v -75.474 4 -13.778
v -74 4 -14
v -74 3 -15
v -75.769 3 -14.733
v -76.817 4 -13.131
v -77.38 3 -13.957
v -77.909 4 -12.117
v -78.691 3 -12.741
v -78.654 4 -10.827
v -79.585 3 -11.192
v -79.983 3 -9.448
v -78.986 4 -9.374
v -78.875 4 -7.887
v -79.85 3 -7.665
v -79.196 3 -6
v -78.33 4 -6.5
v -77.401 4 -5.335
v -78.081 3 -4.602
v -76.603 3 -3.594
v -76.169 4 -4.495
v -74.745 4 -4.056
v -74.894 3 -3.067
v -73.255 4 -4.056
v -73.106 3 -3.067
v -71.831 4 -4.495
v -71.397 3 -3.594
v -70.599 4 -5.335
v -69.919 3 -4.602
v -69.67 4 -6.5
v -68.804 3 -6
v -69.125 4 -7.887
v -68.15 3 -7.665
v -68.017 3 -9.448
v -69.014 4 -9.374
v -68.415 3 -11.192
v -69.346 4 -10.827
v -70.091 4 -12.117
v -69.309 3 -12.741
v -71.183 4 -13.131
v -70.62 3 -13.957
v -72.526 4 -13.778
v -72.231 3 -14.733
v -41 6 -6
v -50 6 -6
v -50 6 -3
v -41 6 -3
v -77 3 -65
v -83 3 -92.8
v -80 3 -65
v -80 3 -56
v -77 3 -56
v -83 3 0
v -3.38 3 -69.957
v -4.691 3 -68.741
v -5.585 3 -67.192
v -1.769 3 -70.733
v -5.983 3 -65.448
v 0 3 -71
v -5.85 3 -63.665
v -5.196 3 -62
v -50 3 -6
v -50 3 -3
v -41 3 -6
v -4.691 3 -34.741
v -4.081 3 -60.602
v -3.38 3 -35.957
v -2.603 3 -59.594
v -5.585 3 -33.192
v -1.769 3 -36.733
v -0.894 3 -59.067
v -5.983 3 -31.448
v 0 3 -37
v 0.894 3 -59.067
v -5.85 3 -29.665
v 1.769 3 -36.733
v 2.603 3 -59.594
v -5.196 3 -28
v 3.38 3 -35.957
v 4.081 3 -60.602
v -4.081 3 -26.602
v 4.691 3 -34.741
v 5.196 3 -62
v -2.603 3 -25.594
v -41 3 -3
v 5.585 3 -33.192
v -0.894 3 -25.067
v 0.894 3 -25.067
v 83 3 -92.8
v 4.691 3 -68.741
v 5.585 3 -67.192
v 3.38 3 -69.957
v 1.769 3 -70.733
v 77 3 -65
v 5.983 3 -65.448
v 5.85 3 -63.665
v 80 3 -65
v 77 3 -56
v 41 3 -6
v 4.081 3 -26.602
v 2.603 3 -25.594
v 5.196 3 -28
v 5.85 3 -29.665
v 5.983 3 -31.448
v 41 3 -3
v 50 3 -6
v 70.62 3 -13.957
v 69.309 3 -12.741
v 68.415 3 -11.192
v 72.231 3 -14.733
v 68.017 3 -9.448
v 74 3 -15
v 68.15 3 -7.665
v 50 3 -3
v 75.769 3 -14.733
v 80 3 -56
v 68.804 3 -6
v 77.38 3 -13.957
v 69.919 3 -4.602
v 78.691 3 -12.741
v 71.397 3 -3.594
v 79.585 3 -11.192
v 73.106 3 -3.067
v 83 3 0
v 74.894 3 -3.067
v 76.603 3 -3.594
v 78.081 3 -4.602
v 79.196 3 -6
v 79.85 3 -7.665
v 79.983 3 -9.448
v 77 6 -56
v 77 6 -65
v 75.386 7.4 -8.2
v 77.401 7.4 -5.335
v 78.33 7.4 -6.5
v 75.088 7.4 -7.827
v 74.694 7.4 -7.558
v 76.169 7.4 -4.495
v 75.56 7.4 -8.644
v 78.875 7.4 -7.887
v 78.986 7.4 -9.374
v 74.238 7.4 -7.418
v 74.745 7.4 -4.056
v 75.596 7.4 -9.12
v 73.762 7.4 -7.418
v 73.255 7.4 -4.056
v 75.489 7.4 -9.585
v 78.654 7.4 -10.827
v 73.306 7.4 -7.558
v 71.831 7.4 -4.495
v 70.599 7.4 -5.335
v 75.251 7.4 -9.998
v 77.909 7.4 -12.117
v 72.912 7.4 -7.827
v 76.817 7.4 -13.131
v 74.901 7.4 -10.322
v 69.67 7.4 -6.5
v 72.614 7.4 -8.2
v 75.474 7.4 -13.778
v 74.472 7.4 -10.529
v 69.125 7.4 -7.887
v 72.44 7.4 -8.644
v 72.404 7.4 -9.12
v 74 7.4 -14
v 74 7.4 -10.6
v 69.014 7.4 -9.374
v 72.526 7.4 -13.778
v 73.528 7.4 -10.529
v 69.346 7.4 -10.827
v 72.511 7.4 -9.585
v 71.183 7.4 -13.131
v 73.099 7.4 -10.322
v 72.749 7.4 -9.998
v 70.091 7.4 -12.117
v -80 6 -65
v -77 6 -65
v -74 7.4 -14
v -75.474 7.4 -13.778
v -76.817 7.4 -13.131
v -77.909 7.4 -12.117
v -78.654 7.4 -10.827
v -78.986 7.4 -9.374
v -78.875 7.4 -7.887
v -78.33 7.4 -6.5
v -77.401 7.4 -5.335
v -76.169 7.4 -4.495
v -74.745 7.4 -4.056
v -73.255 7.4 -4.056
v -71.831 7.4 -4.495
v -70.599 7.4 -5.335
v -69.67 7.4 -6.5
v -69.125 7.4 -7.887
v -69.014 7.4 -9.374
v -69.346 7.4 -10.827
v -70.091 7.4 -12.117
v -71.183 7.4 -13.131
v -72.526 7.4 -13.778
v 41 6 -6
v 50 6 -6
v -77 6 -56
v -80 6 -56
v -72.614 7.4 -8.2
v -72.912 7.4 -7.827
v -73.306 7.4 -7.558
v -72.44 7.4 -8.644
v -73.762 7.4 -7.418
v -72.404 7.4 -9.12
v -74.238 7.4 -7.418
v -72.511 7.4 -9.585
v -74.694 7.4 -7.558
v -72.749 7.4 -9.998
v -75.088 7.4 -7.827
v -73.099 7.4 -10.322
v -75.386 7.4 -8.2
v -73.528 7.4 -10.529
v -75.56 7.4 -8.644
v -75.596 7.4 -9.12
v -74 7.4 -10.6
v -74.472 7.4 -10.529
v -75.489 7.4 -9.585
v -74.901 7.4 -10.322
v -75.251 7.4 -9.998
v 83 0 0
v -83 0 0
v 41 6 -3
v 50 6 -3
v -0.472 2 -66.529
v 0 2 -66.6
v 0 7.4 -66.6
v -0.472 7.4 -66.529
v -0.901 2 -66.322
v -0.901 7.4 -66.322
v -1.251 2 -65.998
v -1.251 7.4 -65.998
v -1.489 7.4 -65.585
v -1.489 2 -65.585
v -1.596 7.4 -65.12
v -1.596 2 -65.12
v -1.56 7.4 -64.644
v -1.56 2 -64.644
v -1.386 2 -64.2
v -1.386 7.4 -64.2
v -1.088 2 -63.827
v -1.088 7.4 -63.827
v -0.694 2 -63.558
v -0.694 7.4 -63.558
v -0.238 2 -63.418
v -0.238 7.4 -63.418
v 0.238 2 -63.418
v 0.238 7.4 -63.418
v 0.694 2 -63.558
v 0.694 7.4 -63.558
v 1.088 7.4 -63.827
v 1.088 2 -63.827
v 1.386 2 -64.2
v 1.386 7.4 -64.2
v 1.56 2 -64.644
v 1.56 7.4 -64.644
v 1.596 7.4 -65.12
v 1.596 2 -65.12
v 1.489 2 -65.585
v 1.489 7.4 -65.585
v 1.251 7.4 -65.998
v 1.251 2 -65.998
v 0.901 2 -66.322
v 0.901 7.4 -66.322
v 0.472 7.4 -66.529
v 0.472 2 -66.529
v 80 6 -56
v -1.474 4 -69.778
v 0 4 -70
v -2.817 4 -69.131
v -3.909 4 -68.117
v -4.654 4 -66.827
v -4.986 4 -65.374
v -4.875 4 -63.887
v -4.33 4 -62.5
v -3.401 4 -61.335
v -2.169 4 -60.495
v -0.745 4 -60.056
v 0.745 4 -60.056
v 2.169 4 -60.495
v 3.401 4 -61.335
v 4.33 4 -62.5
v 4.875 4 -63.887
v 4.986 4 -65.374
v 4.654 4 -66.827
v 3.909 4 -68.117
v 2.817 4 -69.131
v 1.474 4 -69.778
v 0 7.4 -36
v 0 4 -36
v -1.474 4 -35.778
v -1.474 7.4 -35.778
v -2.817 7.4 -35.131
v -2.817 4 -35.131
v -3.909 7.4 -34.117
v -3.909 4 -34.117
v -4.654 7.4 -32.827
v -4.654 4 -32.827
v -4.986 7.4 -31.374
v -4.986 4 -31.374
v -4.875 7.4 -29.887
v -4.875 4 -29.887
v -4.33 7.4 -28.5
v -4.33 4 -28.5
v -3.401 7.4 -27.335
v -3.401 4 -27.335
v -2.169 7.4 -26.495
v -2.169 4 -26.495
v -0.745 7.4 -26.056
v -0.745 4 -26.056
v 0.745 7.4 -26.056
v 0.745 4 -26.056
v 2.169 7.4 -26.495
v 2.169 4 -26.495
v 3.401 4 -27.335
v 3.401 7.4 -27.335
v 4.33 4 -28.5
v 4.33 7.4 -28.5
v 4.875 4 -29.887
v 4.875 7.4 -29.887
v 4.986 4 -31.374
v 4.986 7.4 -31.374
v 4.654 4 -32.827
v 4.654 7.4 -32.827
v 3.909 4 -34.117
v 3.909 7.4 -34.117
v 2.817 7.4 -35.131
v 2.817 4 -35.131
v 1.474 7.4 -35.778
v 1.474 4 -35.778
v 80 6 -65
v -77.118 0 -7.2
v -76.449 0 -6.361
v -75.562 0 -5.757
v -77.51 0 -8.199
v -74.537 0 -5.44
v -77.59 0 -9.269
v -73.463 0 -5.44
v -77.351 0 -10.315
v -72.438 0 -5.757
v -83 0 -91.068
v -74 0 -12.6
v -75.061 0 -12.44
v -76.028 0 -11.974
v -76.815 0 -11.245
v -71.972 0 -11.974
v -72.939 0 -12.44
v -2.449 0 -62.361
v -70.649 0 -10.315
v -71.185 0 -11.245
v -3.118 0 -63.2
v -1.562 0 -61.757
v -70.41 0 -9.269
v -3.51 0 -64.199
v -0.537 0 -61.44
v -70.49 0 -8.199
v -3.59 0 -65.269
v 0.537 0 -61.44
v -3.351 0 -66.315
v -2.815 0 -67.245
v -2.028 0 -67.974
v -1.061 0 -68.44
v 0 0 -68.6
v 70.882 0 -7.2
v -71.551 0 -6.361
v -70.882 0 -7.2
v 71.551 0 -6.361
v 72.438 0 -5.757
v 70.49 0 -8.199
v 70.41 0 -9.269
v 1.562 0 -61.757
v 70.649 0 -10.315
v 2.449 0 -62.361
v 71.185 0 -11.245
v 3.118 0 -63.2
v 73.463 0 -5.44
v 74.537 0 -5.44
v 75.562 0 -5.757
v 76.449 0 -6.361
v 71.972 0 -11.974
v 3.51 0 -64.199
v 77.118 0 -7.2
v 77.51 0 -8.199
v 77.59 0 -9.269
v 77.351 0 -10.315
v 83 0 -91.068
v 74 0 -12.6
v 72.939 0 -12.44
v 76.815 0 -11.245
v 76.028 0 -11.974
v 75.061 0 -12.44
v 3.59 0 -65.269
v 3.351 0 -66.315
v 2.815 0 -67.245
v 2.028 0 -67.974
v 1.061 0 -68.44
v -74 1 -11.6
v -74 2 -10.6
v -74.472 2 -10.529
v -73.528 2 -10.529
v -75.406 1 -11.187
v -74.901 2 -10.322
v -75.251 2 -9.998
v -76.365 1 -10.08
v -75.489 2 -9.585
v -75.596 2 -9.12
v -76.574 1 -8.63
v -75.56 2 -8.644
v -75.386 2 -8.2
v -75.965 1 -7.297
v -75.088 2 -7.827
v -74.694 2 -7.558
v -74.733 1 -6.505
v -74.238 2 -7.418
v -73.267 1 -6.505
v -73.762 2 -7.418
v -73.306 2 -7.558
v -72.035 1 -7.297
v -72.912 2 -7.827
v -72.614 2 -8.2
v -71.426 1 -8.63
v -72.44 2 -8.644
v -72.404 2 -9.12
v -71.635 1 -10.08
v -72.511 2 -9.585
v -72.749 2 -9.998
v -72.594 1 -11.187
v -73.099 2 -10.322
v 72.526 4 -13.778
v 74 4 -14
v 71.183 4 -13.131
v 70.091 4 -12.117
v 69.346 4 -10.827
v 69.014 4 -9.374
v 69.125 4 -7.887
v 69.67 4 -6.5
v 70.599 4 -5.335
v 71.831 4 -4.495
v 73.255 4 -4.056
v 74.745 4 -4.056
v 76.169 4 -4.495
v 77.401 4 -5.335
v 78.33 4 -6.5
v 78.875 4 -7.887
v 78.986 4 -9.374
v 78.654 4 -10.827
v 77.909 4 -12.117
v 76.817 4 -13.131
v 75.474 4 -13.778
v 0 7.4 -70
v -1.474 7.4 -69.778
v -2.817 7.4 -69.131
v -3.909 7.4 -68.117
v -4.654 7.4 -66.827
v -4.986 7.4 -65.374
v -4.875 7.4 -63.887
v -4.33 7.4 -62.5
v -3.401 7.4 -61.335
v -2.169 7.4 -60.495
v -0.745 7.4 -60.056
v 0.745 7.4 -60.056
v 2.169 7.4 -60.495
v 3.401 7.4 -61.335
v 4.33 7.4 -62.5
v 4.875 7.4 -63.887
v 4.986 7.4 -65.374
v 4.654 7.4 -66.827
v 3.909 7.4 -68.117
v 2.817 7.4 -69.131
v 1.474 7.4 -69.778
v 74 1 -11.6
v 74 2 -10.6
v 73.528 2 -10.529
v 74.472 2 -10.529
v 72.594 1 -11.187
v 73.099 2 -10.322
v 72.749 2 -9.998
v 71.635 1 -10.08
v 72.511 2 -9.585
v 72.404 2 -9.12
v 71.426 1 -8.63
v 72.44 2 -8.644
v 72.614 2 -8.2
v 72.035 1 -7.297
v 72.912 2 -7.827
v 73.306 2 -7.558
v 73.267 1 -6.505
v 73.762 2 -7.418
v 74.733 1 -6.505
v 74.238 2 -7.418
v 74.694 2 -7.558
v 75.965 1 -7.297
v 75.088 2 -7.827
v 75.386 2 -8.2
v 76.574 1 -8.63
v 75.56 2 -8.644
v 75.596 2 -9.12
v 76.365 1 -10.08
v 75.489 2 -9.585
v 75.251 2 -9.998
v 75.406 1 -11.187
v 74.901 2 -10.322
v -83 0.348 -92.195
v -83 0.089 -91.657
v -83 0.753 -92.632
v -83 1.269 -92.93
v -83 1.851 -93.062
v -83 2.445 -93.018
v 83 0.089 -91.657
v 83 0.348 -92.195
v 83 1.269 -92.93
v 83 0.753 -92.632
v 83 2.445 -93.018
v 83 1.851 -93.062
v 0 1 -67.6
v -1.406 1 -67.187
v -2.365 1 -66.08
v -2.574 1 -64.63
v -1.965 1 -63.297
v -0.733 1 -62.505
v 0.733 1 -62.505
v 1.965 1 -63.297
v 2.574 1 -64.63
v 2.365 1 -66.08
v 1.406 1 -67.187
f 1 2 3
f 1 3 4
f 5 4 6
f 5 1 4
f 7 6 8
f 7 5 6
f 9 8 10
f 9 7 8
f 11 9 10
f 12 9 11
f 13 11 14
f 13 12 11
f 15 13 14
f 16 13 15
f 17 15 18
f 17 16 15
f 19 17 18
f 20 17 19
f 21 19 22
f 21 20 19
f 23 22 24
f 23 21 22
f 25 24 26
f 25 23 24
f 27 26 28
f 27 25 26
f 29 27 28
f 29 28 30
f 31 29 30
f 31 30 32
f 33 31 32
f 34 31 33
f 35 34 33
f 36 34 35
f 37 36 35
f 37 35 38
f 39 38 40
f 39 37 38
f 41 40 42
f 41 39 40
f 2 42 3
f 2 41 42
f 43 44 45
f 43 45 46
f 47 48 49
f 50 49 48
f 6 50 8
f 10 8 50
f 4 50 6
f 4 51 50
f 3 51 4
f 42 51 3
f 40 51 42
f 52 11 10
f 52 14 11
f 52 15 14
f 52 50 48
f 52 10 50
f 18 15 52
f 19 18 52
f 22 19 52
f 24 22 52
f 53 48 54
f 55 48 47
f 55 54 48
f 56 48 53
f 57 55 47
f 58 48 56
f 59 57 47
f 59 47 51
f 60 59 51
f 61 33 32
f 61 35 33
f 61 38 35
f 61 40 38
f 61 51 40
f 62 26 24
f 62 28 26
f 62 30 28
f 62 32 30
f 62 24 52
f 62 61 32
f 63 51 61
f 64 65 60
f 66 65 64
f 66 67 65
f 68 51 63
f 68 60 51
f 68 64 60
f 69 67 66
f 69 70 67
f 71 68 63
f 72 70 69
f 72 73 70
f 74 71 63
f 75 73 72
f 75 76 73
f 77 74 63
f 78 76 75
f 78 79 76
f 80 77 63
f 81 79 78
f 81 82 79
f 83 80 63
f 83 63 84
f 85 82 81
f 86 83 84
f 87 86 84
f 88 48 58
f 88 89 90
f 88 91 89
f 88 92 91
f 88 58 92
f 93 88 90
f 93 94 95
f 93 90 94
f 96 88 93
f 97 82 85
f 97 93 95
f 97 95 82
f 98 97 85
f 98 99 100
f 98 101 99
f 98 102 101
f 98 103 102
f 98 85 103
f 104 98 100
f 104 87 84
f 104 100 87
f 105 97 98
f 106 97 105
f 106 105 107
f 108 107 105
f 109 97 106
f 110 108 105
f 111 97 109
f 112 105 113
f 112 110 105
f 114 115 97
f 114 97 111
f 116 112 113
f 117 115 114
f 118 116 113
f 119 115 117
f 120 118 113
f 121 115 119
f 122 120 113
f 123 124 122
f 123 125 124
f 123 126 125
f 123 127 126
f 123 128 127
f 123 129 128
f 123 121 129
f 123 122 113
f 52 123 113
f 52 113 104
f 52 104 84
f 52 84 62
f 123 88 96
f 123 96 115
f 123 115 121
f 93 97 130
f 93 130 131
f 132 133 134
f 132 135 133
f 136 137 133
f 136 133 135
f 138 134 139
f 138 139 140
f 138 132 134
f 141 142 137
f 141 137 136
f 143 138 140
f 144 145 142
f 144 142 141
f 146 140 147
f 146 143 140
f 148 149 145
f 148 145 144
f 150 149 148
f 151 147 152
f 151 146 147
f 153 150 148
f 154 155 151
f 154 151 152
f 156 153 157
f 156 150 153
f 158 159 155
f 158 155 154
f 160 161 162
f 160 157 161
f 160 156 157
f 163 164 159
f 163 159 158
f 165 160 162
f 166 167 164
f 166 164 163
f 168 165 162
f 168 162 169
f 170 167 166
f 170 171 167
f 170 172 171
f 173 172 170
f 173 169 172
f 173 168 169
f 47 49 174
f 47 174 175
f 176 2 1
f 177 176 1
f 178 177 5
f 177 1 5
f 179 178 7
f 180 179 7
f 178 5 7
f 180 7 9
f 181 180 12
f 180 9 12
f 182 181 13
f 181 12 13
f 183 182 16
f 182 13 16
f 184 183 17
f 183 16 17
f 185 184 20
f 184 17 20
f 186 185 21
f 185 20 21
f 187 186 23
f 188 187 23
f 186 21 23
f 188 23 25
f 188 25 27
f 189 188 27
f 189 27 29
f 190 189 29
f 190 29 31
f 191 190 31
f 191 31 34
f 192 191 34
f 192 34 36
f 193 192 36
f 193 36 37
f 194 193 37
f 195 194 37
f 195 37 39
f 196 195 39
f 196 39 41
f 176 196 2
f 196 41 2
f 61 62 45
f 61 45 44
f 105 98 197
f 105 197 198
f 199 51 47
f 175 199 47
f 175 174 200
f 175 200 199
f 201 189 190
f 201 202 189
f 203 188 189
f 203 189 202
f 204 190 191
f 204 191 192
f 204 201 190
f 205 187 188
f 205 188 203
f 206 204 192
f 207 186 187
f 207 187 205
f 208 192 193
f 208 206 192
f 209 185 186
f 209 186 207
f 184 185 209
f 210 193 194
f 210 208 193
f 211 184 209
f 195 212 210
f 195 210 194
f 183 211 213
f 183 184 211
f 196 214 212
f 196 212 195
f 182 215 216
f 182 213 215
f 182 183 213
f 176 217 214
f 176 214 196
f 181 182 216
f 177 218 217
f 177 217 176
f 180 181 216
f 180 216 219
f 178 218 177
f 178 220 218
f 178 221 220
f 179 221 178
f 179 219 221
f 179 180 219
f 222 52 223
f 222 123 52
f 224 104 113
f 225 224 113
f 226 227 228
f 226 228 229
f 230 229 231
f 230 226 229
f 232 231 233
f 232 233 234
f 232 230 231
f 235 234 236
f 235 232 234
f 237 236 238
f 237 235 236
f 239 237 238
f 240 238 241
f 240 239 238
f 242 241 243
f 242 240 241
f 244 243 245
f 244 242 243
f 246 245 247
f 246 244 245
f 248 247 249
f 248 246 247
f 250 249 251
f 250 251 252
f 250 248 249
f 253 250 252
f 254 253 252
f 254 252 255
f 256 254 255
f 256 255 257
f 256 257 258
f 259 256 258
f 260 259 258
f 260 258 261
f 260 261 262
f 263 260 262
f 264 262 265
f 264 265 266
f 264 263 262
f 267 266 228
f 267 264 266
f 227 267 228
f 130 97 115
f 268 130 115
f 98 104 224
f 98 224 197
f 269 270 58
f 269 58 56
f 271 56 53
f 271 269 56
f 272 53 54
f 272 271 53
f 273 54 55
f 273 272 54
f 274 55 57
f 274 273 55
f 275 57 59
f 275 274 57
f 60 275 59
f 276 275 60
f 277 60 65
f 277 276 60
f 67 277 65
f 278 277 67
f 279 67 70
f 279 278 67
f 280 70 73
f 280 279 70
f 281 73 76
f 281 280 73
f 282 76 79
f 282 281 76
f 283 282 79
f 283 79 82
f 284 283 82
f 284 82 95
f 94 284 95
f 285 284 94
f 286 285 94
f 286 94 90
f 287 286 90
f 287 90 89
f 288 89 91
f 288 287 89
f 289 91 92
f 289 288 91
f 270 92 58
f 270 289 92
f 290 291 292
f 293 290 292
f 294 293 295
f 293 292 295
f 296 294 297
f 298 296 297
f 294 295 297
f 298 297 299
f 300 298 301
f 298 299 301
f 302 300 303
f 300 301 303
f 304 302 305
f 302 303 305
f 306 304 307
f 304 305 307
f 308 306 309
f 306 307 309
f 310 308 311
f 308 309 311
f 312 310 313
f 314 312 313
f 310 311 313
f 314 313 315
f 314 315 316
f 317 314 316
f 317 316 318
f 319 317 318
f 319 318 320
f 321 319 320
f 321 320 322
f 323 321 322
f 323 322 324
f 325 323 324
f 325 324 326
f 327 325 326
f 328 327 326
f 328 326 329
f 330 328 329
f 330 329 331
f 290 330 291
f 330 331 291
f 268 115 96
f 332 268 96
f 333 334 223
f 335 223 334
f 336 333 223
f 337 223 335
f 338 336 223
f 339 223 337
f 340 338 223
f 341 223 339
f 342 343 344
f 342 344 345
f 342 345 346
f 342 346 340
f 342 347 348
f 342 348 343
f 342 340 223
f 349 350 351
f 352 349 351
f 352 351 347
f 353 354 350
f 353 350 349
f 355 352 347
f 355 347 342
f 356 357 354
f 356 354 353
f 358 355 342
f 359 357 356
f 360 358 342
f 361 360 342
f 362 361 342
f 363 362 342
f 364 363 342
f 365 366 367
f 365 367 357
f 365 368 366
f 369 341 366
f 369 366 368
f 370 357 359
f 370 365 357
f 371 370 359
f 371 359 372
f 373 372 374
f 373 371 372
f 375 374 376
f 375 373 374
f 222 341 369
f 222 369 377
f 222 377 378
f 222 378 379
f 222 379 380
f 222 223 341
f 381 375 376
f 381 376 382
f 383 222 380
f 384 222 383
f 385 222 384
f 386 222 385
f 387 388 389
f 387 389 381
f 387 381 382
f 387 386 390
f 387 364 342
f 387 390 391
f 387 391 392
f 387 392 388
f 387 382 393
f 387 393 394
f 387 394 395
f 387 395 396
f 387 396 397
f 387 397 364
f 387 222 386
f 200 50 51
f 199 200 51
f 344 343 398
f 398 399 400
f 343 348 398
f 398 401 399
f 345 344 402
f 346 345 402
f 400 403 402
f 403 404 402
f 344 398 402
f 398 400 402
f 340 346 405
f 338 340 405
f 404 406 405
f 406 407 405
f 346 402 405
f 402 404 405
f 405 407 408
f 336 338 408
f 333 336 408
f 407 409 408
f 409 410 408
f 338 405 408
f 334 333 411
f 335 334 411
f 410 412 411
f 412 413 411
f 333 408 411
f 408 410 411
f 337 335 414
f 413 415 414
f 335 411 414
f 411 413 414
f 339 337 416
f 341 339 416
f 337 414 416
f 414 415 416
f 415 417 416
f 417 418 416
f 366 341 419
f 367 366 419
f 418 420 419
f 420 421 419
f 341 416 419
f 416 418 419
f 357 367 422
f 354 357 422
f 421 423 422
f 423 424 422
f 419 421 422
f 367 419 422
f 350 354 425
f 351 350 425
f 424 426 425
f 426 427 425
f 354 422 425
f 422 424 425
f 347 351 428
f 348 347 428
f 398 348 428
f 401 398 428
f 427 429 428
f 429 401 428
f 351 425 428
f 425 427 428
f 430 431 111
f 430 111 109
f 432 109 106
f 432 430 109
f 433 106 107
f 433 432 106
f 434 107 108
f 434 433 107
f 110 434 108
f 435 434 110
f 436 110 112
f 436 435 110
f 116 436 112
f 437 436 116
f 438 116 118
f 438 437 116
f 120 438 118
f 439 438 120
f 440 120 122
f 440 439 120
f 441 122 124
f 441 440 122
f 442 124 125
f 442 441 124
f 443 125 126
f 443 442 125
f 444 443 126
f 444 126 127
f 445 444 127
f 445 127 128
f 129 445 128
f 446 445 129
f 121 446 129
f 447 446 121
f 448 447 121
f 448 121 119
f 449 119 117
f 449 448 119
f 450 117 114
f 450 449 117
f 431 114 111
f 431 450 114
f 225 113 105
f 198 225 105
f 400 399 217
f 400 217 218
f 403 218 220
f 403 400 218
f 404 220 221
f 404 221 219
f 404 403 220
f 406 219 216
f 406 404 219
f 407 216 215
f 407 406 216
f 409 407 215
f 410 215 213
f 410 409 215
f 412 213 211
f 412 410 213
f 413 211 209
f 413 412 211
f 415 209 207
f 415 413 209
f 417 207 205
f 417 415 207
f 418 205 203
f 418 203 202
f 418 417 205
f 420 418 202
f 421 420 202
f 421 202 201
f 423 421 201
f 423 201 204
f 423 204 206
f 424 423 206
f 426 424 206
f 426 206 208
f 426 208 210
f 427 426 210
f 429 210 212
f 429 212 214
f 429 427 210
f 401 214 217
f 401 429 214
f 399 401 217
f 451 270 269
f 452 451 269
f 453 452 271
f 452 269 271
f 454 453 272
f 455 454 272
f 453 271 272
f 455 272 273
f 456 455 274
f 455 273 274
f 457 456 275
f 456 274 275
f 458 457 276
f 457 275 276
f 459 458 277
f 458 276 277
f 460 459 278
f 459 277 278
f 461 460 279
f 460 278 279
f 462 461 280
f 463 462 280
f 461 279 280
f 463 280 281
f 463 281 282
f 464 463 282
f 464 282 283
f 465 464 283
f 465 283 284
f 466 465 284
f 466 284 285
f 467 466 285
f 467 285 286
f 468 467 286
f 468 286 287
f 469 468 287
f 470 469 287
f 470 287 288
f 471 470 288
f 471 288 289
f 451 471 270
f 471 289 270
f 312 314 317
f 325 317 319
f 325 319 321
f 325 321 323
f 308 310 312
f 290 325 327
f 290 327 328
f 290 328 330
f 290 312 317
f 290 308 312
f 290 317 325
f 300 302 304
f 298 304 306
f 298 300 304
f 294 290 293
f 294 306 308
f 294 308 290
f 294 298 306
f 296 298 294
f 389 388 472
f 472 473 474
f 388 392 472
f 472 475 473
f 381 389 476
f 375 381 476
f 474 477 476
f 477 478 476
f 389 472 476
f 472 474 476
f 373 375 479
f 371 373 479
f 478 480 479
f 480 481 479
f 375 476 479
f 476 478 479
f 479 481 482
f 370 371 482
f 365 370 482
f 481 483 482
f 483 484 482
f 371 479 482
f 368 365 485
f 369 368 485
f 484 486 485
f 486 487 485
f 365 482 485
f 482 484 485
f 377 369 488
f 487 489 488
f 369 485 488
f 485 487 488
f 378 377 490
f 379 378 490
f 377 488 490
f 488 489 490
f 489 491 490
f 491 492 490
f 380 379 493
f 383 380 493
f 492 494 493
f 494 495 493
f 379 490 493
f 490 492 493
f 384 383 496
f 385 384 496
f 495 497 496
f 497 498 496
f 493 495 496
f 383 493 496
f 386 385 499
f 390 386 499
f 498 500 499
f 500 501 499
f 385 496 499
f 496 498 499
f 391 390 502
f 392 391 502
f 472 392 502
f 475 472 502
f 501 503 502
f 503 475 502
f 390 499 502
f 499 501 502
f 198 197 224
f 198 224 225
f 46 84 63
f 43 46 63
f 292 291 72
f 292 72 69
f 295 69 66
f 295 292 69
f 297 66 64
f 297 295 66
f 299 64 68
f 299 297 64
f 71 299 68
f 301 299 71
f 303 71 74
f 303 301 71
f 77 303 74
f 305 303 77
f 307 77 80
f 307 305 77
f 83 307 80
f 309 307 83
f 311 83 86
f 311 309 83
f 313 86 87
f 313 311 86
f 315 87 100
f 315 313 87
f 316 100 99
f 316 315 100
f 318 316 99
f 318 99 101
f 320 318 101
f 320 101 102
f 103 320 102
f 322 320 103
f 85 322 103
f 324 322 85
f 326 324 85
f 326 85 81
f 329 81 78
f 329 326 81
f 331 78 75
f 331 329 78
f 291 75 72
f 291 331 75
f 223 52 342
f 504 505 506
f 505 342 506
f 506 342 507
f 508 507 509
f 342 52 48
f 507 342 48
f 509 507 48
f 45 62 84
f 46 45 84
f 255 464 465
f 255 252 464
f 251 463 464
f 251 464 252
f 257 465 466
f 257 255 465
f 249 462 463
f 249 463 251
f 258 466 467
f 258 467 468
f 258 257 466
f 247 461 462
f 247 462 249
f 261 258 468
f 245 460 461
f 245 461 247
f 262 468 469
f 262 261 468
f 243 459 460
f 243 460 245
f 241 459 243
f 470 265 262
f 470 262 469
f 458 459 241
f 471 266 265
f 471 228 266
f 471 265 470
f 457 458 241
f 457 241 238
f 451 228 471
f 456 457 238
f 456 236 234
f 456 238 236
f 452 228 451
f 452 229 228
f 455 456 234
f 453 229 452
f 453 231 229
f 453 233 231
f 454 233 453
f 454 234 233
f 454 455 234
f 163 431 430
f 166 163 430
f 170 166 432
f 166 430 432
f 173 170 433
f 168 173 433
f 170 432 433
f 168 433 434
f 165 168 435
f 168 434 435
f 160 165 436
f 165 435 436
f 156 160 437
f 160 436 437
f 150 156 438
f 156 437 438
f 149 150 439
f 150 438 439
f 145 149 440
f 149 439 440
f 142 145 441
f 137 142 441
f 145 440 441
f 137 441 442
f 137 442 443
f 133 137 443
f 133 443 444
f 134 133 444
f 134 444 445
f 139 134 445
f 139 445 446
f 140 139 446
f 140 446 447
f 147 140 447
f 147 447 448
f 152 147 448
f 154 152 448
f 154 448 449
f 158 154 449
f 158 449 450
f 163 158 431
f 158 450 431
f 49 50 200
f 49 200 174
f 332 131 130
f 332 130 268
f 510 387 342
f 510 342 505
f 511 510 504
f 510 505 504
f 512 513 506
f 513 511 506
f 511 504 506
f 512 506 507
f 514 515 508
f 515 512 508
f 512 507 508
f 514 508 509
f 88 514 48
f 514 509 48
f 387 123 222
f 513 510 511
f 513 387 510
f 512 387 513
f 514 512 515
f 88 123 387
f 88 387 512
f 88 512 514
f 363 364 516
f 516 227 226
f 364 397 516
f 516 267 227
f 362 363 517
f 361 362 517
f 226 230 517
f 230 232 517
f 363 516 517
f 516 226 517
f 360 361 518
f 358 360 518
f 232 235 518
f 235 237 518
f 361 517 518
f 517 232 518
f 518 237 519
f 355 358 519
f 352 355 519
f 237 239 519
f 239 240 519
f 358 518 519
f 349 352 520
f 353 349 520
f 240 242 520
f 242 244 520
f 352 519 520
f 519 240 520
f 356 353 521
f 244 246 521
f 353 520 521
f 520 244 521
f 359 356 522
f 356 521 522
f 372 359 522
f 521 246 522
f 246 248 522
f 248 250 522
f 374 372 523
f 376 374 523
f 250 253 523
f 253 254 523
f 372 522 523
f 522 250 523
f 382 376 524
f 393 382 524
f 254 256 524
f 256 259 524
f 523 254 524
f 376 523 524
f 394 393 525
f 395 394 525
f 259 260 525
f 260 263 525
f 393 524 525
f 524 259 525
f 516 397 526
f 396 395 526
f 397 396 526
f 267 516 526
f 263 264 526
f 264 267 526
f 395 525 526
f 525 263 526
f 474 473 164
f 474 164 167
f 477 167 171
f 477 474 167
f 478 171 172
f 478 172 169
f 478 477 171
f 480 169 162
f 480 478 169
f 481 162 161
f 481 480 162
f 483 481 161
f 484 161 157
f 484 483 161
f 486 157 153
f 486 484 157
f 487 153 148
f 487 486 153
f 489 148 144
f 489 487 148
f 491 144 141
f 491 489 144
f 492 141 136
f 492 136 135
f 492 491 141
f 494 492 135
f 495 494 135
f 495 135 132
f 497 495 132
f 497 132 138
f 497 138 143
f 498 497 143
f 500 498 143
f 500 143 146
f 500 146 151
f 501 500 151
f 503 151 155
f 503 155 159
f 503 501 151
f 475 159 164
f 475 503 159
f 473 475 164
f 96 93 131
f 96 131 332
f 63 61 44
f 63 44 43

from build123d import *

# Parameters (mm, degrees)
EXTRUDE_1_DEPTH     = 83
EXTRUDE_START       = 3
SKETCH_2_R          = 5
EXTRUDE_2_DEPTH     = 4.4
SKETCH_3_R          = 1.6
CUT_EXTRUDE_1_DEPTH = 7.4
CHAMFER_1_SIZE      = 2
SKETCH_4_W          = 9
SKETCH_4_H          = 3
SKETCH_4_W_2        = 3
SKETCH_4_H_2        = 9
EXTRUDE_3_DEPTH     = 3
CHAMFER_2_SIZE      = 1
FILLET_1_R          = 2


with BuildPart() as part:
    # 草图1 → 凸台-拉伸1 (new, symmetric)
    with BuildSketch(Plane(origin=(0, 0, 0), x_dir=(0, 0, -1), z_dir=(1, 0, 0))):
        Polygon((0, 3), (0, 0), (95.8, 0), (92.8, 3), align=None)
    extrude(amount=EXTRUDE_1_DEPTH, both=True)

    # 草图2 → 凸台-拉伸2 (add)
    with BuildSketch(Plane(origin=(0, 0, 0), x_dir=(1, 0, 0), z_dir=(0, 1, 0)).offset(EXTRUDE_START)):
        with Locations(Location((-74, 9, 0), (0, 0, 90))):
            Circle(SKETCH_2_R)
        with Locations(Location((74, 9, 0), (0, 0, 90))):
            Circle(SKETCH_2_R)
        with Locations(Location((0, 65, 0), (0, 0, 90))):
            Circle(SKETCH_2_R)
        with Locations(Location((0, 31, 0), (0, 0, 90))):
            Circle(SKETCH_2_R)
    extrude(amount=EXTRUDE_2_DEPTH)

    # 草图3 → 切除-拉伸1 (cut)
    with BuildSketch(Plane(origin=(0, 0, 0), x_dir=(1, 0, 0), z_dir=(0, 1, 0))):
        with Locations(Location((74, 9, 0), (0, 0, 90))):
            Circle(SKETCH_3_R)
        with Locations(Location((-74, 9, 0), (0, 0, 90))):
            Circle(SKETCH_3_R)
        with Locations(Location((0, 65, 0), (0, 0, 90))):
            Circle(SKETCH_3_R)
    extrude(amount=CUT_EXTRUDE_1_DEPTH, mode=Mode.SUBTRACT)

    # 倒角1
    chamfer_1_edges = [part.edges().sort_by_distance(p)[0] for p in [
        (74, 0, -7.4),
        (-74, 0, -7.4),
        (0, 0, -63.4),
    ]]
    chamfer(chamfer_1_edges, length=CHAMFER_1_SIZE)

    # 草图4 → 凸台-拉伸3 (add)
    with BuildSketch(Plane(origin=(0, 0, 0), x_dir=(1, 0, 0), z_dir=(0, 1, 0)).offset(EXTRUDE_START)):
        with Locations((45.5, 4.5)):
            Rectangle(SKETCH_4_W, SKETCH_4_H)
        with Locations((-45.5, 4.5)):
            Rectangle(SKETCH_4_W, SKETCH_4_H)
        with Locations((-78.5, 60.5)):
            Rectangle(SKETCH_4_W_2, SKETCH_4_H_2)
        with Locations((78.5, 60.5)):
            Rectangle(SKETCH_4_W_2, SKETCH_4_H_2)
    extrude(amount=EXTRUDE_3_DEPTH)

    # 倒角2
    chamfer_2_edges = [part.edges().sort_by_distance(p)[0] for p in [
        (-74, 3, -4),
        (74, 3, -4),
        (0, 3, -60),
        (0, 3, -26),
    ]]
    chamfer(chamfer_2_edges, length=CHAMFER_2_SIZE)

    # 圆角1
    # the kernel refuses this fillet: 2 mm, written as the material it takes off along each edge
    with BuildSketch(Plane(origin=(-94.830127019, 0, -95.8), x_dir=(0, 0.7071067811865416, 0.7071067811865535), z_dir=(1, 0, 0))) as fillet_1_piece_1:
        with BuildLine():
            CenterArc((4.760278777, 1.931851653), FILLET_1_R, 135, 120)
            Line((3.346065215, 3.346065215), (3.317780944, 3.374349486))
            Line((3.317780944, 3.374349486), (-0.028284271, 0.028284271))
            Line((-0.028284271, 0.028284271), (0, -0.04))
            ThreePointArc((0, -0.04), (2.121320344, -0.04), (4.232287925, -0.038637033))
            Line((4.232287925, -0.038637033), (4.242640687, 0))
        make_face()
    extrude(amount=189.660254038, mode=Mode.SUBTRACT)


solid = part.part
